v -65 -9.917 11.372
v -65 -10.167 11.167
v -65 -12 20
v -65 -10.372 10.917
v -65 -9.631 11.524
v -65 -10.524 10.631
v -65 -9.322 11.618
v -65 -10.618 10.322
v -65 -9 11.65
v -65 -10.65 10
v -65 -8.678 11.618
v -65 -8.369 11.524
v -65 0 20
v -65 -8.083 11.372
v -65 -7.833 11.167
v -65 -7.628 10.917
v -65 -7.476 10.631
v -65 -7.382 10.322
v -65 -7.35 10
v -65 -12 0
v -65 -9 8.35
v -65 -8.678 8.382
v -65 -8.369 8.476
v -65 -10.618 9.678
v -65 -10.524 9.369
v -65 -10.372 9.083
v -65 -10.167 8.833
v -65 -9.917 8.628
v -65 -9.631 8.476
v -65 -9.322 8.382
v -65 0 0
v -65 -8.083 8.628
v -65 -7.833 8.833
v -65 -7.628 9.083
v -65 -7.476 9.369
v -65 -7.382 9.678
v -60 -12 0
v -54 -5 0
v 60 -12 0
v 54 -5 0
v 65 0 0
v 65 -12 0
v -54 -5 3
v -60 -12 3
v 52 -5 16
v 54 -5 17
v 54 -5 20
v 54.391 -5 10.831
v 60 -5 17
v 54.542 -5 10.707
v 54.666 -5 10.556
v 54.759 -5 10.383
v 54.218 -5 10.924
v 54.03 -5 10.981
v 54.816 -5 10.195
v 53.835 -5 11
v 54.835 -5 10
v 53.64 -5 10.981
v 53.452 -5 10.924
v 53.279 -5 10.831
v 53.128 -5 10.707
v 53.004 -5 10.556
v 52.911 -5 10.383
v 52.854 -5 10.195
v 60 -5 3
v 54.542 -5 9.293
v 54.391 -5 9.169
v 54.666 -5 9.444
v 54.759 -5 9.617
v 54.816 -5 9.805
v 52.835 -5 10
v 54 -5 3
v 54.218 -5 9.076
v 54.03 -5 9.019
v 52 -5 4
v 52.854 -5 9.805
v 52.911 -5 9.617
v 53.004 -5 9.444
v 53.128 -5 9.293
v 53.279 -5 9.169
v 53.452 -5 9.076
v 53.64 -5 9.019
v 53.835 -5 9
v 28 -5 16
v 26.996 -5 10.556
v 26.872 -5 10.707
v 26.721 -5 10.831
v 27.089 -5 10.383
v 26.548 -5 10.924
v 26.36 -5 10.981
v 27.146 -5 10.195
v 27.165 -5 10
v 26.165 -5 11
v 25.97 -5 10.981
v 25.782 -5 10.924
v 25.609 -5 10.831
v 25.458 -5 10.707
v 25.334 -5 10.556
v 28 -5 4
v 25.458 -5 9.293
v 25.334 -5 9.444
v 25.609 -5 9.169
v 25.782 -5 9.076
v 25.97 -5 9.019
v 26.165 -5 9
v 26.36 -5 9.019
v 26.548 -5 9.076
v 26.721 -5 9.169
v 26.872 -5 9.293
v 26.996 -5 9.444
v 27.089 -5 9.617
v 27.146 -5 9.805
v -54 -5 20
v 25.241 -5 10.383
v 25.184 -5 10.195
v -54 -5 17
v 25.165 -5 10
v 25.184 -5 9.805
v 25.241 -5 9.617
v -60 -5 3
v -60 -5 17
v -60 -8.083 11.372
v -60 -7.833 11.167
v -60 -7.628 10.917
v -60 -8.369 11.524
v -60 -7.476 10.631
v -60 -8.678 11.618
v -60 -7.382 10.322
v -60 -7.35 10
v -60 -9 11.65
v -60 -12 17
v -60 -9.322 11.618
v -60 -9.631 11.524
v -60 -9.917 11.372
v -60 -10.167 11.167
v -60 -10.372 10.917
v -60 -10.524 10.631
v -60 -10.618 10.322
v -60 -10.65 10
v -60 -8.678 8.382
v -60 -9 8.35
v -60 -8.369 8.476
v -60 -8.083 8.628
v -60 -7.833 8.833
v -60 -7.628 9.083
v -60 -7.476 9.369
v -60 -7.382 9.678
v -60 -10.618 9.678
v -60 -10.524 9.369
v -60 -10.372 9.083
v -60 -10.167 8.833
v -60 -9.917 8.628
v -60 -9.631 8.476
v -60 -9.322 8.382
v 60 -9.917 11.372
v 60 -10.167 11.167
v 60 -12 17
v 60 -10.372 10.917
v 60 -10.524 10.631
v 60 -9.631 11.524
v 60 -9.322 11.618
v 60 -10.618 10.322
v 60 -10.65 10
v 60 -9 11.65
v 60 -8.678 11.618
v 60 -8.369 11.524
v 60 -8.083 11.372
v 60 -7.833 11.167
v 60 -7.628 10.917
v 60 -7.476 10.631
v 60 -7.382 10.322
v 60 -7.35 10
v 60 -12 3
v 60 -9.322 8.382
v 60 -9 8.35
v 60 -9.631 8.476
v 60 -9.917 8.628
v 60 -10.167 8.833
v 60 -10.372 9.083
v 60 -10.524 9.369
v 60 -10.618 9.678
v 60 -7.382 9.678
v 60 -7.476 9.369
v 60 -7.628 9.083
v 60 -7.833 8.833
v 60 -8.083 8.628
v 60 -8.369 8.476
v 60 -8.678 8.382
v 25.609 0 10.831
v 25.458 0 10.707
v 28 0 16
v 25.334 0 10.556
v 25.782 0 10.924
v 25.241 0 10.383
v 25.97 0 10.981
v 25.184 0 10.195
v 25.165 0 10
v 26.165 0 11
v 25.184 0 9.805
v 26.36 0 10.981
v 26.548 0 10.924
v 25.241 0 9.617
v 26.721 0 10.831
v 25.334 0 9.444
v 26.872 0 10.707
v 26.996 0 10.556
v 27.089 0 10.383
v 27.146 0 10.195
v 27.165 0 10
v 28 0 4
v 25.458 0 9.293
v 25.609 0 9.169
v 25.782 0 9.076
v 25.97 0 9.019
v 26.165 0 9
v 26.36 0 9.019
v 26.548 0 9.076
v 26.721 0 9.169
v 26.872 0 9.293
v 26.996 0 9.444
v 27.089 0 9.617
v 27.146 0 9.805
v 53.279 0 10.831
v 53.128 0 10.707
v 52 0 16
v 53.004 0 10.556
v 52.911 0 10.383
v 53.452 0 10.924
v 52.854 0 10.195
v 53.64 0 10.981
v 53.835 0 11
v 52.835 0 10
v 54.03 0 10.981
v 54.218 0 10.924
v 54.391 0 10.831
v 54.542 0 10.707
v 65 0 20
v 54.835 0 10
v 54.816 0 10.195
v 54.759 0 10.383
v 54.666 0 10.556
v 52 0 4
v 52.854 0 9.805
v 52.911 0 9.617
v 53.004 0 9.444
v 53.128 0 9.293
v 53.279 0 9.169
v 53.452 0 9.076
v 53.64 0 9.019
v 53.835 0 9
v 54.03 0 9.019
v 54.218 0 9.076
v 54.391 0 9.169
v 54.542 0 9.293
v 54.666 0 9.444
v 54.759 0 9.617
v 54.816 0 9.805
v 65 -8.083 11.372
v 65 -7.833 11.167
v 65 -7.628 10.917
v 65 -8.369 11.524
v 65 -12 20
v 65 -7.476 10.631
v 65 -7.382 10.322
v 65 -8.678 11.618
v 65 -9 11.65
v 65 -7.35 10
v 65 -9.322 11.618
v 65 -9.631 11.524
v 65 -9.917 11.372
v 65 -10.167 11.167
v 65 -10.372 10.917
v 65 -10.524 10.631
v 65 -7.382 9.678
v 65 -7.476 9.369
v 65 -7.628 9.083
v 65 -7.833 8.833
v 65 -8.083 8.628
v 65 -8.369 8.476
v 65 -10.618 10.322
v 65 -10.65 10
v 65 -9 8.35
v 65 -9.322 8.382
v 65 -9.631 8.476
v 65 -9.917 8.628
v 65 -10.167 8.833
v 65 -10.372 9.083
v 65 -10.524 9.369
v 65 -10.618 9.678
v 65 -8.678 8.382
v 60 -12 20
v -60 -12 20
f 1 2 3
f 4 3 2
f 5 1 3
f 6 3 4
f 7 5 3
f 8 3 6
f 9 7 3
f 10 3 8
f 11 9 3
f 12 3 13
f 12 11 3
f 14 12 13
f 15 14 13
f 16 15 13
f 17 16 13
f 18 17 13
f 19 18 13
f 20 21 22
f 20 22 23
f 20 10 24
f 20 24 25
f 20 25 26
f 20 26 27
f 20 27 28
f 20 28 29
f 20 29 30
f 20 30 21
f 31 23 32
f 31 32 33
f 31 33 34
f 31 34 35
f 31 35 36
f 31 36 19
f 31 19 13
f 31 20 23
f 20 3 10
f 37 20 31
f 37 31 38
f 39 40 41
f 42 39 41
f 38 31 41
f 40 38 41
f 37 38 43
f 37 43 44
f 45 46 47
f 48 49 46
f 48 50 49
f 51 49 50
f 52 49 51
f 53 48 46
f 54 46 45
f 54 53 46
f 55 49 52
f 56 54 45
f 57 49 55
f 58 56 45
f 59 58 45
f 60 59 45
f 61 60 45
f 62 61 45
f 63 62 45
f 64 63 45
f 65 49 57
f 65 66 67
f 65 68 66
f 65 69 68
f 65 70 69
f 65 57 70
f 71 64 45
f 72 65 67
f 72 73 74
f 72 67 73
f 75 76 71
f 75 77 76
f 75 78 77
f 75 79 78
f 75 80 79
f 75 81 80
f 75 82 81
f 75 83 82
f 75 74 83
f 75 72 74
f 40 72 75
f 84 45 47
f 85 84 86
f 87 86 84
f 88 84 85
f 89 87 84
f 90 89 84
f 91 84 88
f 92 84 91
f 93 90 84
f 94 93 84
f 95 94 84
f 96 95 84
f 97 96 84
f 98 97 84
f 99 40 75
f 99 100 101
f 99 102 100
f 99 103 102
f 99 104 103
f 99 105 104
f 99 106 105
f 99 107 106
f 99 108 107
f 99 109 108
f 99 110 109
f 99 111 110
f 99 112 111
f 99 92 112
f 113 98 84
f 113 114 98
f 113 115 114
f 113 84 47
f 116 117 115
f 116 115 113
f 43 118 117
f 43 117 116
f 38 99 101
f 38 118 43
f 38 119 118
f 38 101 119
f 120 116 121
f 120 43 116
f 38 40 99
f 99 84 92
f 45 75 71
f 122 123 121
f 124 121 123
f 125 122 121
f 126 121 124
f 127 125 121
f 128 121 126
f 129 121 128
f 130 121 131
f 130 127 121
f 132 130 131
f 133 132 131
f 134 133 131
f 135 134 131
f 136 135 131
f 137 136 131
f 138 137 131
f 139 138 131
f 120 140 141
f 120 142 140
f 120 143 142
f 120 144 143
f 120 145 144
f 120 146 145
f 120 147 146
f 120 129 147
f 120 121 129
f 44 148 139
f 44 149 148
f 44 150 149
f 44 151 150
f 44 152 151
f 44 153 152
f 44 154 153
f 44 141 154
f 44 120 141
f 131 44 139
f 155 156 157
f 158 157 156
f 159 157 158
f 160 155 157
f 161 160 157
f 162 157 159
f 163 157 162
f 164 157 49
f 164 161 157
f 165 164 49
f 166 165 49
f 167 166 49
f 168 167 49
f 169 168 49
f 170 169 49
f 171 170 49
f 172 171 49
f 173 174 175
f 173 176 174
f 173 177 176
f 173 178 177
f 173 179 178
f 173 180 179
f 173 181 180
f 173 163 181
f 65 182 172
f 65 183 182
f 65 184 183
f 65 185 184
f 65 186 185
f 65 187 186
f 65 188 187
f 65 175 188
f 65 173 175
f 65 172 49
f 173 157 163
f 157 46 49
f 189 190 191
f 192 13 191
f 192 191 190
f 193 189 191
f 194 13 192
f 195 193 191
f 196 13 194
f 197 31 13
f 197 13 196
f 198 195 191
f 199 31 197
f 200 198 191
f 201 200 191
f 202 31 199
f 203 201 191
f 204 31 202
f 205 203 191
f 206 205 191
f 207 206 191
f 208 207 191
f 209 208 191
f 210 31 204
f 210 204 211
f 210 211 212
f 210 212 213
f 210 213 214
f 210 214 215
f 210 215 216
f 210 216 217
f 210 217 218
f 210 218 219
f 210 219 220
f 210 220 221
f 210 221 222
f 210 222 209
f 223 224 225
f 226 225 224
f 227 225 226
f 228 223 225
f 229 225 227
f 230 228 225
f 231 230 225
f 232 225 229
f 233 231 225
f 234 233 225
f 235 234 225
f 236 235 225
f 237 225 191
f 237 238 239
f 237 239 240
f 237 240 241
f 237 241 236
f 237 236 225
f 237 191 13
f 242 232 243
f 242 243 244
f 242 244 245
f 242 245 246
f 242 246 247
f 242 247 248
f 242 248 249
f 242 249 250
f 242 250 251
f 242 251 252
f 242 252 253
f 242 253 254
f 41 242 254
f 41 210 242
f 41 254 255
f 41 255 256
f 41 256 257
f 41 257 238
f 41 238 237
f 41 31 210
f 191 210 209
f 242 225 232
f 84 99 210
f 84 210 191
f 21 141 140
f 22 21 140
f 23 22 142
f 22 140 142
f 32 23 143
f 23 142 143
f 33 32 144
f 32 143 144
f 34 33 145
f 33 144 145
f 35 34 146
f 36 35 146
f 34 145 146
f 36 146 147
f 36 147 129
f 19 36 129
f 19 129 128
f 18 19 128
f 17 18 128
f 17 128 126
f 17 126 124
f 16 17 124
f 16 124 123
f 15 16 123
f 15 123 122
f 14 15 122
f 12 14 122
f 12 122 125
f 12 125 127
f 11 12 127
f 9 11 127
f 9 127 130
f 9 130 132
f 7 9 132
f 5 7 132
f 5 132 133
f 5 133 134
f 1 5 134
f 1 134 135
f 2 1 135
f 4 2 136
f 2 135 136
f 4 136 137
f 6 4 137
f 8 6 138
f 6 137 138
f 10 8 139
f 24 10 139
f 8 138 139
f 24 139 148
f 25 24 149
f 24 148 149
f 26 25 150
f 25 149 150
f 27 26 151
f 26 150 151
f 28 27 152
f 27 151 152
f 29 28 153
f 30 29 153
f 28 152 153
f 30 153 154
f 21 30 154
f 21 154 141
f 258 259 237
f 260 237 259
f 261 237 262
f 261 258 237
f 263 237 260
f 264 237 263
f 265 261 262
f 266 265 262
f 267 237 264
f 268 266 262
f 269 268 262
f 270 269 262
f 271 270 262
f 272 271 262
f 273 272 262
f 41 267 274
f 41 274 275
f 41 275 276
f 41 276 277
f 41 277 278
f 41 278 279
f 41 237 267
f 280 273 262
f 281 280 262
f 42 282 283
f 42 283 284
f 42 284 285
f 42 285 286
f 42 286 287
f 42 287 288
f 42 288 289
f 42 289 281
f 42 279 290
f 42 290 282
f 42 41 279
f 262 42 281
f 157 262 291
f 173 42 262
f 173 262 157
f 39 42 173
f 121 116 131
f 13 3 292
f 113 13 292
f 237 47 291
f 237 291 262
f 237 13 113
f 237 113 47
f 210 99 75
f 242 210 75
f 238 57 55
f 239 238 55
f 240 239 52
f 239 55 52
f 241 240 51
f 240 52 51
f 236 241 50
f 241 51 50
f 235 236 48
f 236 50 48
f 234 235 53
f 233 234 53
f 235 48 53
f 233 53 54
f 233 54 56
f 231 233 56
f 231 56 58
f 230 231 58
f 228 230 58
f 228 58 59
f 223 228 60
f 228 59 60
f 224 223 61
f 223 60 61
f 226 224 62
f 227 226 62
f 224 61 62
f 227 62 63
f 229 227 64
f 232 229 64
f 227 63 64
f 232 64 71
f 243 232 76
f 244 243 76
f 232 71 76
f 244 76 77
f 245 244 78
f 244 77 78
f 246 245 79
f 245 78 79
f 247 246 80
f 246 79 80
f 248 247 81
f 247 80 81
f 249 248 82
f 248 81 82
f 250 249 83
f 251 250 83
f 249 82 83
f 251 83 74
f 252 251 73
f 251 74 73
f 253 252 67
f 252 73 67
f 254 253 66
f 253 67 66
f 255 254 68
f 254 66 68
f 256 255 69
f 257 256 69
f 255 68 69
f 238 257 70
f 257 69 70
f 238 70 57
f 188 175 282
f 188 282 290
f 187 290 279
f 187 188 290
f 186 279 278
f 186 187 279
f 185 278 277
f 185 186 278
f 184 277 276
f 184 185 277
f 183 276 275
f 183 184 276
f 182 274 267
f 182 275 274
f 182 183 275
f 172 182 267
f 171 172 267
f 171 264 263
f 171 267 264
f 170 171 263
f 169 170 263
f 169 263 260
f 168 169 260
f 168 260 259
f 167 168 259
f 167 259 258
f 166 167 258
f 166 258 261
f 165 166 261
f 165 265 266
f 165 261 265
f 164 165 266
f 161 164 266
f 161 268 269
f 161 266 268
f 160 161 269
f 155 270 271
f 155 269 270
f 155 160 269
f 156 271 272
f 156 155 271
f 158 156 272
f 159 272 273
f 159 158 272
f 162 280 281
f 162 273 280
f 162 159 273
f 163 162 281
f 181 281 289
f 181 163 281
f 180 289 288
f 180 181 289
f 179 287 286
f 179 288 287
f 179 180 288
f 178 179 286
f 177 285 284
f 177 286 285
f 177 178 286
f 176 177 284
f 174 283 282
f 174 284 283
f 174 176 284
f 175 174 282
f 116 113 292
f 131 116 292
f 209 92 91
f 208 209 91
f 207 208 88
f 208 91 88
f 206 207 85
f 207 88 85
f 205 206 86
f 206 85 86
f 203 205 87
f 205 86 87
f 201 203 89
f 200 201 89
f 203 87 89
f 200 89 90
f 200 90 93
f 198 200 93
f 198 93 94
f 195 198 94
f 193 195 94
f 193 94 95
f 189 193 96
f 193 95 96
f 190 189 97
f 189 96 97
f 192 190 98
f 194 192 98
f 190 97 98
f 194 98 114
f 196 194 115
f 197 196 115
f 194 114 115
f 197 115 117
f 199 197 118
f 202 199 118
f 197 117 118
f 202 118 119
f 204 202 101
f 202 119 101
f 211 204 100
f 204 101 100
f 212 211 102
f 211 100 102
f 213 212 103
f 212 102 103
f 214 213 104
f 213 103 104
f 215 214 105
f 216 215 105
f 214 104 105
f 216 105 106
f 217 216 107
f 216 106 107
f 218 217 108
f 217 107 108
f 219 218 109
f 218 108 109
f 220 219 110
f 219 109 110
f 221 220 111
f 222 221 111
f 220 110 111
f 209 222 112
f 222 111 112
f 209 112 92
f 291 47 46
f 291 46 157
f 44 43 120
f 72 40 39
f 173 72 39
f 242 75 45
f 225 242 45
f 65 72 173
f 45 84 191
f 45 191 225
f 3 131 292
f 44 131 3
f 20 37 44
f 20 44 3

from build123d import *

# Parameters (mm, degrees)
EXTRUDE_2_DEPTH          = 20
SKETCH_3_R               = 1.65
CUT_EXTRUDE_1_DEPTH      = 126
CUT_EXTRUDE_1_DEPTH_BACK = 6
EXTRUDE_3_DEPTH          = 3
MIRROR_2_COPY_1_DEPTH    = 3
SKETCH_7_W               = 24
SKETCH_7_H               = 12
CUT_EXTRUDE_2_DEPTH      = 5
SKETCH_10_R              = 1
CUT_EXTRUDE_3_DEPTH      = 5


with BuildPart() as part:
    # 草图1 → 凸台-拉伸2 (new body)
    with BuildSketch(Plane.XY):
        Polygon((-65, 0), (65, 0), (65, -12), (60, -12), (60, -5), (-60, -5), (-60, -12), (-65, -12), align=None)
    extrude(amount=EXTRUDE_2_DEPTH)

    # 草图3 → 切除-拉伸1 (cut, two sides)
    with BuildSketch(Plane(origin=(-60, 0, 0), x_dir=(0, 0, -1), z_dir=(1, 0, 0))) as cut_extrude_1_sk:
        with Locations((-10, -9)):
            Circle(SKETCH_3_R)
    extrude(amount=CUT_EXTRUDE_1_DEPTH, mode=Mode.SUBTRACT)
    extrude(cut_extrude_1_sk.sketch, amount=-CUT_EXTRUDE_1_DEPTH_BACK, mode=Mode.SUBTRACT)

    # 草图4 → 凸台-拉伸3 (add)
    with BuildSketch(Plane(origin=(0, 0, 0), x_dir=(-1, 0, 0), z_dir=(0, 0, -1))):
        Polygon((54, -5), (60, -12), (60, -5), align=None)
    extrude_3 = extrude(amount=-EXTRUDE_3_DEPTH)

    # 镜向1: 凸台-拉伸3 across plane
    add(extrude_3.mirror(Plane.XY.offset(10)))

    # 镜向2: 凸台-拉伸3 across plane
    add(extrude_3.mirror(Plane(origin=(0, 0, 0), x_dir=(0, 0, 1), z_dir=(1, 0, 0))))

    # 镜向2 copy 1 sketch → 镜向2 copy 1 (add)
    with BuildSketch(Plane.XY.offset(20)):
        Polygon((54, -5), (60, -12), (60, -5), align=None)
    extrude(amount=-MIRROR_2_COPY_1_DEPTH)

    # 草图7 → 切除-拉伸2 (cut)
    with BuildSketch(Plane.XZ.offset(5)):
        with Locations((40, 10)):
            Rectangle(SKETCH_7_W, SKETCH_7_H)
    extrude(amount=-CUT_EXTRUDE_2_DEPTH, mode=Mode.SUBTRACT)

    # 草图10 → 切除-拉伸3 (cut)
    with BuildSketch(Plane.XZ.offset(5)):
        with Locations((53.835, 10)):
            Circle(SKETCH_10_R)
        with Locations((26.165, 10)):
            Circle(SKETCH_10_R)
    extrude(amount=-CUT_EXTRUDE_3_DEPTH, mode=Mode.SUBTRACT)


solid = part.part
